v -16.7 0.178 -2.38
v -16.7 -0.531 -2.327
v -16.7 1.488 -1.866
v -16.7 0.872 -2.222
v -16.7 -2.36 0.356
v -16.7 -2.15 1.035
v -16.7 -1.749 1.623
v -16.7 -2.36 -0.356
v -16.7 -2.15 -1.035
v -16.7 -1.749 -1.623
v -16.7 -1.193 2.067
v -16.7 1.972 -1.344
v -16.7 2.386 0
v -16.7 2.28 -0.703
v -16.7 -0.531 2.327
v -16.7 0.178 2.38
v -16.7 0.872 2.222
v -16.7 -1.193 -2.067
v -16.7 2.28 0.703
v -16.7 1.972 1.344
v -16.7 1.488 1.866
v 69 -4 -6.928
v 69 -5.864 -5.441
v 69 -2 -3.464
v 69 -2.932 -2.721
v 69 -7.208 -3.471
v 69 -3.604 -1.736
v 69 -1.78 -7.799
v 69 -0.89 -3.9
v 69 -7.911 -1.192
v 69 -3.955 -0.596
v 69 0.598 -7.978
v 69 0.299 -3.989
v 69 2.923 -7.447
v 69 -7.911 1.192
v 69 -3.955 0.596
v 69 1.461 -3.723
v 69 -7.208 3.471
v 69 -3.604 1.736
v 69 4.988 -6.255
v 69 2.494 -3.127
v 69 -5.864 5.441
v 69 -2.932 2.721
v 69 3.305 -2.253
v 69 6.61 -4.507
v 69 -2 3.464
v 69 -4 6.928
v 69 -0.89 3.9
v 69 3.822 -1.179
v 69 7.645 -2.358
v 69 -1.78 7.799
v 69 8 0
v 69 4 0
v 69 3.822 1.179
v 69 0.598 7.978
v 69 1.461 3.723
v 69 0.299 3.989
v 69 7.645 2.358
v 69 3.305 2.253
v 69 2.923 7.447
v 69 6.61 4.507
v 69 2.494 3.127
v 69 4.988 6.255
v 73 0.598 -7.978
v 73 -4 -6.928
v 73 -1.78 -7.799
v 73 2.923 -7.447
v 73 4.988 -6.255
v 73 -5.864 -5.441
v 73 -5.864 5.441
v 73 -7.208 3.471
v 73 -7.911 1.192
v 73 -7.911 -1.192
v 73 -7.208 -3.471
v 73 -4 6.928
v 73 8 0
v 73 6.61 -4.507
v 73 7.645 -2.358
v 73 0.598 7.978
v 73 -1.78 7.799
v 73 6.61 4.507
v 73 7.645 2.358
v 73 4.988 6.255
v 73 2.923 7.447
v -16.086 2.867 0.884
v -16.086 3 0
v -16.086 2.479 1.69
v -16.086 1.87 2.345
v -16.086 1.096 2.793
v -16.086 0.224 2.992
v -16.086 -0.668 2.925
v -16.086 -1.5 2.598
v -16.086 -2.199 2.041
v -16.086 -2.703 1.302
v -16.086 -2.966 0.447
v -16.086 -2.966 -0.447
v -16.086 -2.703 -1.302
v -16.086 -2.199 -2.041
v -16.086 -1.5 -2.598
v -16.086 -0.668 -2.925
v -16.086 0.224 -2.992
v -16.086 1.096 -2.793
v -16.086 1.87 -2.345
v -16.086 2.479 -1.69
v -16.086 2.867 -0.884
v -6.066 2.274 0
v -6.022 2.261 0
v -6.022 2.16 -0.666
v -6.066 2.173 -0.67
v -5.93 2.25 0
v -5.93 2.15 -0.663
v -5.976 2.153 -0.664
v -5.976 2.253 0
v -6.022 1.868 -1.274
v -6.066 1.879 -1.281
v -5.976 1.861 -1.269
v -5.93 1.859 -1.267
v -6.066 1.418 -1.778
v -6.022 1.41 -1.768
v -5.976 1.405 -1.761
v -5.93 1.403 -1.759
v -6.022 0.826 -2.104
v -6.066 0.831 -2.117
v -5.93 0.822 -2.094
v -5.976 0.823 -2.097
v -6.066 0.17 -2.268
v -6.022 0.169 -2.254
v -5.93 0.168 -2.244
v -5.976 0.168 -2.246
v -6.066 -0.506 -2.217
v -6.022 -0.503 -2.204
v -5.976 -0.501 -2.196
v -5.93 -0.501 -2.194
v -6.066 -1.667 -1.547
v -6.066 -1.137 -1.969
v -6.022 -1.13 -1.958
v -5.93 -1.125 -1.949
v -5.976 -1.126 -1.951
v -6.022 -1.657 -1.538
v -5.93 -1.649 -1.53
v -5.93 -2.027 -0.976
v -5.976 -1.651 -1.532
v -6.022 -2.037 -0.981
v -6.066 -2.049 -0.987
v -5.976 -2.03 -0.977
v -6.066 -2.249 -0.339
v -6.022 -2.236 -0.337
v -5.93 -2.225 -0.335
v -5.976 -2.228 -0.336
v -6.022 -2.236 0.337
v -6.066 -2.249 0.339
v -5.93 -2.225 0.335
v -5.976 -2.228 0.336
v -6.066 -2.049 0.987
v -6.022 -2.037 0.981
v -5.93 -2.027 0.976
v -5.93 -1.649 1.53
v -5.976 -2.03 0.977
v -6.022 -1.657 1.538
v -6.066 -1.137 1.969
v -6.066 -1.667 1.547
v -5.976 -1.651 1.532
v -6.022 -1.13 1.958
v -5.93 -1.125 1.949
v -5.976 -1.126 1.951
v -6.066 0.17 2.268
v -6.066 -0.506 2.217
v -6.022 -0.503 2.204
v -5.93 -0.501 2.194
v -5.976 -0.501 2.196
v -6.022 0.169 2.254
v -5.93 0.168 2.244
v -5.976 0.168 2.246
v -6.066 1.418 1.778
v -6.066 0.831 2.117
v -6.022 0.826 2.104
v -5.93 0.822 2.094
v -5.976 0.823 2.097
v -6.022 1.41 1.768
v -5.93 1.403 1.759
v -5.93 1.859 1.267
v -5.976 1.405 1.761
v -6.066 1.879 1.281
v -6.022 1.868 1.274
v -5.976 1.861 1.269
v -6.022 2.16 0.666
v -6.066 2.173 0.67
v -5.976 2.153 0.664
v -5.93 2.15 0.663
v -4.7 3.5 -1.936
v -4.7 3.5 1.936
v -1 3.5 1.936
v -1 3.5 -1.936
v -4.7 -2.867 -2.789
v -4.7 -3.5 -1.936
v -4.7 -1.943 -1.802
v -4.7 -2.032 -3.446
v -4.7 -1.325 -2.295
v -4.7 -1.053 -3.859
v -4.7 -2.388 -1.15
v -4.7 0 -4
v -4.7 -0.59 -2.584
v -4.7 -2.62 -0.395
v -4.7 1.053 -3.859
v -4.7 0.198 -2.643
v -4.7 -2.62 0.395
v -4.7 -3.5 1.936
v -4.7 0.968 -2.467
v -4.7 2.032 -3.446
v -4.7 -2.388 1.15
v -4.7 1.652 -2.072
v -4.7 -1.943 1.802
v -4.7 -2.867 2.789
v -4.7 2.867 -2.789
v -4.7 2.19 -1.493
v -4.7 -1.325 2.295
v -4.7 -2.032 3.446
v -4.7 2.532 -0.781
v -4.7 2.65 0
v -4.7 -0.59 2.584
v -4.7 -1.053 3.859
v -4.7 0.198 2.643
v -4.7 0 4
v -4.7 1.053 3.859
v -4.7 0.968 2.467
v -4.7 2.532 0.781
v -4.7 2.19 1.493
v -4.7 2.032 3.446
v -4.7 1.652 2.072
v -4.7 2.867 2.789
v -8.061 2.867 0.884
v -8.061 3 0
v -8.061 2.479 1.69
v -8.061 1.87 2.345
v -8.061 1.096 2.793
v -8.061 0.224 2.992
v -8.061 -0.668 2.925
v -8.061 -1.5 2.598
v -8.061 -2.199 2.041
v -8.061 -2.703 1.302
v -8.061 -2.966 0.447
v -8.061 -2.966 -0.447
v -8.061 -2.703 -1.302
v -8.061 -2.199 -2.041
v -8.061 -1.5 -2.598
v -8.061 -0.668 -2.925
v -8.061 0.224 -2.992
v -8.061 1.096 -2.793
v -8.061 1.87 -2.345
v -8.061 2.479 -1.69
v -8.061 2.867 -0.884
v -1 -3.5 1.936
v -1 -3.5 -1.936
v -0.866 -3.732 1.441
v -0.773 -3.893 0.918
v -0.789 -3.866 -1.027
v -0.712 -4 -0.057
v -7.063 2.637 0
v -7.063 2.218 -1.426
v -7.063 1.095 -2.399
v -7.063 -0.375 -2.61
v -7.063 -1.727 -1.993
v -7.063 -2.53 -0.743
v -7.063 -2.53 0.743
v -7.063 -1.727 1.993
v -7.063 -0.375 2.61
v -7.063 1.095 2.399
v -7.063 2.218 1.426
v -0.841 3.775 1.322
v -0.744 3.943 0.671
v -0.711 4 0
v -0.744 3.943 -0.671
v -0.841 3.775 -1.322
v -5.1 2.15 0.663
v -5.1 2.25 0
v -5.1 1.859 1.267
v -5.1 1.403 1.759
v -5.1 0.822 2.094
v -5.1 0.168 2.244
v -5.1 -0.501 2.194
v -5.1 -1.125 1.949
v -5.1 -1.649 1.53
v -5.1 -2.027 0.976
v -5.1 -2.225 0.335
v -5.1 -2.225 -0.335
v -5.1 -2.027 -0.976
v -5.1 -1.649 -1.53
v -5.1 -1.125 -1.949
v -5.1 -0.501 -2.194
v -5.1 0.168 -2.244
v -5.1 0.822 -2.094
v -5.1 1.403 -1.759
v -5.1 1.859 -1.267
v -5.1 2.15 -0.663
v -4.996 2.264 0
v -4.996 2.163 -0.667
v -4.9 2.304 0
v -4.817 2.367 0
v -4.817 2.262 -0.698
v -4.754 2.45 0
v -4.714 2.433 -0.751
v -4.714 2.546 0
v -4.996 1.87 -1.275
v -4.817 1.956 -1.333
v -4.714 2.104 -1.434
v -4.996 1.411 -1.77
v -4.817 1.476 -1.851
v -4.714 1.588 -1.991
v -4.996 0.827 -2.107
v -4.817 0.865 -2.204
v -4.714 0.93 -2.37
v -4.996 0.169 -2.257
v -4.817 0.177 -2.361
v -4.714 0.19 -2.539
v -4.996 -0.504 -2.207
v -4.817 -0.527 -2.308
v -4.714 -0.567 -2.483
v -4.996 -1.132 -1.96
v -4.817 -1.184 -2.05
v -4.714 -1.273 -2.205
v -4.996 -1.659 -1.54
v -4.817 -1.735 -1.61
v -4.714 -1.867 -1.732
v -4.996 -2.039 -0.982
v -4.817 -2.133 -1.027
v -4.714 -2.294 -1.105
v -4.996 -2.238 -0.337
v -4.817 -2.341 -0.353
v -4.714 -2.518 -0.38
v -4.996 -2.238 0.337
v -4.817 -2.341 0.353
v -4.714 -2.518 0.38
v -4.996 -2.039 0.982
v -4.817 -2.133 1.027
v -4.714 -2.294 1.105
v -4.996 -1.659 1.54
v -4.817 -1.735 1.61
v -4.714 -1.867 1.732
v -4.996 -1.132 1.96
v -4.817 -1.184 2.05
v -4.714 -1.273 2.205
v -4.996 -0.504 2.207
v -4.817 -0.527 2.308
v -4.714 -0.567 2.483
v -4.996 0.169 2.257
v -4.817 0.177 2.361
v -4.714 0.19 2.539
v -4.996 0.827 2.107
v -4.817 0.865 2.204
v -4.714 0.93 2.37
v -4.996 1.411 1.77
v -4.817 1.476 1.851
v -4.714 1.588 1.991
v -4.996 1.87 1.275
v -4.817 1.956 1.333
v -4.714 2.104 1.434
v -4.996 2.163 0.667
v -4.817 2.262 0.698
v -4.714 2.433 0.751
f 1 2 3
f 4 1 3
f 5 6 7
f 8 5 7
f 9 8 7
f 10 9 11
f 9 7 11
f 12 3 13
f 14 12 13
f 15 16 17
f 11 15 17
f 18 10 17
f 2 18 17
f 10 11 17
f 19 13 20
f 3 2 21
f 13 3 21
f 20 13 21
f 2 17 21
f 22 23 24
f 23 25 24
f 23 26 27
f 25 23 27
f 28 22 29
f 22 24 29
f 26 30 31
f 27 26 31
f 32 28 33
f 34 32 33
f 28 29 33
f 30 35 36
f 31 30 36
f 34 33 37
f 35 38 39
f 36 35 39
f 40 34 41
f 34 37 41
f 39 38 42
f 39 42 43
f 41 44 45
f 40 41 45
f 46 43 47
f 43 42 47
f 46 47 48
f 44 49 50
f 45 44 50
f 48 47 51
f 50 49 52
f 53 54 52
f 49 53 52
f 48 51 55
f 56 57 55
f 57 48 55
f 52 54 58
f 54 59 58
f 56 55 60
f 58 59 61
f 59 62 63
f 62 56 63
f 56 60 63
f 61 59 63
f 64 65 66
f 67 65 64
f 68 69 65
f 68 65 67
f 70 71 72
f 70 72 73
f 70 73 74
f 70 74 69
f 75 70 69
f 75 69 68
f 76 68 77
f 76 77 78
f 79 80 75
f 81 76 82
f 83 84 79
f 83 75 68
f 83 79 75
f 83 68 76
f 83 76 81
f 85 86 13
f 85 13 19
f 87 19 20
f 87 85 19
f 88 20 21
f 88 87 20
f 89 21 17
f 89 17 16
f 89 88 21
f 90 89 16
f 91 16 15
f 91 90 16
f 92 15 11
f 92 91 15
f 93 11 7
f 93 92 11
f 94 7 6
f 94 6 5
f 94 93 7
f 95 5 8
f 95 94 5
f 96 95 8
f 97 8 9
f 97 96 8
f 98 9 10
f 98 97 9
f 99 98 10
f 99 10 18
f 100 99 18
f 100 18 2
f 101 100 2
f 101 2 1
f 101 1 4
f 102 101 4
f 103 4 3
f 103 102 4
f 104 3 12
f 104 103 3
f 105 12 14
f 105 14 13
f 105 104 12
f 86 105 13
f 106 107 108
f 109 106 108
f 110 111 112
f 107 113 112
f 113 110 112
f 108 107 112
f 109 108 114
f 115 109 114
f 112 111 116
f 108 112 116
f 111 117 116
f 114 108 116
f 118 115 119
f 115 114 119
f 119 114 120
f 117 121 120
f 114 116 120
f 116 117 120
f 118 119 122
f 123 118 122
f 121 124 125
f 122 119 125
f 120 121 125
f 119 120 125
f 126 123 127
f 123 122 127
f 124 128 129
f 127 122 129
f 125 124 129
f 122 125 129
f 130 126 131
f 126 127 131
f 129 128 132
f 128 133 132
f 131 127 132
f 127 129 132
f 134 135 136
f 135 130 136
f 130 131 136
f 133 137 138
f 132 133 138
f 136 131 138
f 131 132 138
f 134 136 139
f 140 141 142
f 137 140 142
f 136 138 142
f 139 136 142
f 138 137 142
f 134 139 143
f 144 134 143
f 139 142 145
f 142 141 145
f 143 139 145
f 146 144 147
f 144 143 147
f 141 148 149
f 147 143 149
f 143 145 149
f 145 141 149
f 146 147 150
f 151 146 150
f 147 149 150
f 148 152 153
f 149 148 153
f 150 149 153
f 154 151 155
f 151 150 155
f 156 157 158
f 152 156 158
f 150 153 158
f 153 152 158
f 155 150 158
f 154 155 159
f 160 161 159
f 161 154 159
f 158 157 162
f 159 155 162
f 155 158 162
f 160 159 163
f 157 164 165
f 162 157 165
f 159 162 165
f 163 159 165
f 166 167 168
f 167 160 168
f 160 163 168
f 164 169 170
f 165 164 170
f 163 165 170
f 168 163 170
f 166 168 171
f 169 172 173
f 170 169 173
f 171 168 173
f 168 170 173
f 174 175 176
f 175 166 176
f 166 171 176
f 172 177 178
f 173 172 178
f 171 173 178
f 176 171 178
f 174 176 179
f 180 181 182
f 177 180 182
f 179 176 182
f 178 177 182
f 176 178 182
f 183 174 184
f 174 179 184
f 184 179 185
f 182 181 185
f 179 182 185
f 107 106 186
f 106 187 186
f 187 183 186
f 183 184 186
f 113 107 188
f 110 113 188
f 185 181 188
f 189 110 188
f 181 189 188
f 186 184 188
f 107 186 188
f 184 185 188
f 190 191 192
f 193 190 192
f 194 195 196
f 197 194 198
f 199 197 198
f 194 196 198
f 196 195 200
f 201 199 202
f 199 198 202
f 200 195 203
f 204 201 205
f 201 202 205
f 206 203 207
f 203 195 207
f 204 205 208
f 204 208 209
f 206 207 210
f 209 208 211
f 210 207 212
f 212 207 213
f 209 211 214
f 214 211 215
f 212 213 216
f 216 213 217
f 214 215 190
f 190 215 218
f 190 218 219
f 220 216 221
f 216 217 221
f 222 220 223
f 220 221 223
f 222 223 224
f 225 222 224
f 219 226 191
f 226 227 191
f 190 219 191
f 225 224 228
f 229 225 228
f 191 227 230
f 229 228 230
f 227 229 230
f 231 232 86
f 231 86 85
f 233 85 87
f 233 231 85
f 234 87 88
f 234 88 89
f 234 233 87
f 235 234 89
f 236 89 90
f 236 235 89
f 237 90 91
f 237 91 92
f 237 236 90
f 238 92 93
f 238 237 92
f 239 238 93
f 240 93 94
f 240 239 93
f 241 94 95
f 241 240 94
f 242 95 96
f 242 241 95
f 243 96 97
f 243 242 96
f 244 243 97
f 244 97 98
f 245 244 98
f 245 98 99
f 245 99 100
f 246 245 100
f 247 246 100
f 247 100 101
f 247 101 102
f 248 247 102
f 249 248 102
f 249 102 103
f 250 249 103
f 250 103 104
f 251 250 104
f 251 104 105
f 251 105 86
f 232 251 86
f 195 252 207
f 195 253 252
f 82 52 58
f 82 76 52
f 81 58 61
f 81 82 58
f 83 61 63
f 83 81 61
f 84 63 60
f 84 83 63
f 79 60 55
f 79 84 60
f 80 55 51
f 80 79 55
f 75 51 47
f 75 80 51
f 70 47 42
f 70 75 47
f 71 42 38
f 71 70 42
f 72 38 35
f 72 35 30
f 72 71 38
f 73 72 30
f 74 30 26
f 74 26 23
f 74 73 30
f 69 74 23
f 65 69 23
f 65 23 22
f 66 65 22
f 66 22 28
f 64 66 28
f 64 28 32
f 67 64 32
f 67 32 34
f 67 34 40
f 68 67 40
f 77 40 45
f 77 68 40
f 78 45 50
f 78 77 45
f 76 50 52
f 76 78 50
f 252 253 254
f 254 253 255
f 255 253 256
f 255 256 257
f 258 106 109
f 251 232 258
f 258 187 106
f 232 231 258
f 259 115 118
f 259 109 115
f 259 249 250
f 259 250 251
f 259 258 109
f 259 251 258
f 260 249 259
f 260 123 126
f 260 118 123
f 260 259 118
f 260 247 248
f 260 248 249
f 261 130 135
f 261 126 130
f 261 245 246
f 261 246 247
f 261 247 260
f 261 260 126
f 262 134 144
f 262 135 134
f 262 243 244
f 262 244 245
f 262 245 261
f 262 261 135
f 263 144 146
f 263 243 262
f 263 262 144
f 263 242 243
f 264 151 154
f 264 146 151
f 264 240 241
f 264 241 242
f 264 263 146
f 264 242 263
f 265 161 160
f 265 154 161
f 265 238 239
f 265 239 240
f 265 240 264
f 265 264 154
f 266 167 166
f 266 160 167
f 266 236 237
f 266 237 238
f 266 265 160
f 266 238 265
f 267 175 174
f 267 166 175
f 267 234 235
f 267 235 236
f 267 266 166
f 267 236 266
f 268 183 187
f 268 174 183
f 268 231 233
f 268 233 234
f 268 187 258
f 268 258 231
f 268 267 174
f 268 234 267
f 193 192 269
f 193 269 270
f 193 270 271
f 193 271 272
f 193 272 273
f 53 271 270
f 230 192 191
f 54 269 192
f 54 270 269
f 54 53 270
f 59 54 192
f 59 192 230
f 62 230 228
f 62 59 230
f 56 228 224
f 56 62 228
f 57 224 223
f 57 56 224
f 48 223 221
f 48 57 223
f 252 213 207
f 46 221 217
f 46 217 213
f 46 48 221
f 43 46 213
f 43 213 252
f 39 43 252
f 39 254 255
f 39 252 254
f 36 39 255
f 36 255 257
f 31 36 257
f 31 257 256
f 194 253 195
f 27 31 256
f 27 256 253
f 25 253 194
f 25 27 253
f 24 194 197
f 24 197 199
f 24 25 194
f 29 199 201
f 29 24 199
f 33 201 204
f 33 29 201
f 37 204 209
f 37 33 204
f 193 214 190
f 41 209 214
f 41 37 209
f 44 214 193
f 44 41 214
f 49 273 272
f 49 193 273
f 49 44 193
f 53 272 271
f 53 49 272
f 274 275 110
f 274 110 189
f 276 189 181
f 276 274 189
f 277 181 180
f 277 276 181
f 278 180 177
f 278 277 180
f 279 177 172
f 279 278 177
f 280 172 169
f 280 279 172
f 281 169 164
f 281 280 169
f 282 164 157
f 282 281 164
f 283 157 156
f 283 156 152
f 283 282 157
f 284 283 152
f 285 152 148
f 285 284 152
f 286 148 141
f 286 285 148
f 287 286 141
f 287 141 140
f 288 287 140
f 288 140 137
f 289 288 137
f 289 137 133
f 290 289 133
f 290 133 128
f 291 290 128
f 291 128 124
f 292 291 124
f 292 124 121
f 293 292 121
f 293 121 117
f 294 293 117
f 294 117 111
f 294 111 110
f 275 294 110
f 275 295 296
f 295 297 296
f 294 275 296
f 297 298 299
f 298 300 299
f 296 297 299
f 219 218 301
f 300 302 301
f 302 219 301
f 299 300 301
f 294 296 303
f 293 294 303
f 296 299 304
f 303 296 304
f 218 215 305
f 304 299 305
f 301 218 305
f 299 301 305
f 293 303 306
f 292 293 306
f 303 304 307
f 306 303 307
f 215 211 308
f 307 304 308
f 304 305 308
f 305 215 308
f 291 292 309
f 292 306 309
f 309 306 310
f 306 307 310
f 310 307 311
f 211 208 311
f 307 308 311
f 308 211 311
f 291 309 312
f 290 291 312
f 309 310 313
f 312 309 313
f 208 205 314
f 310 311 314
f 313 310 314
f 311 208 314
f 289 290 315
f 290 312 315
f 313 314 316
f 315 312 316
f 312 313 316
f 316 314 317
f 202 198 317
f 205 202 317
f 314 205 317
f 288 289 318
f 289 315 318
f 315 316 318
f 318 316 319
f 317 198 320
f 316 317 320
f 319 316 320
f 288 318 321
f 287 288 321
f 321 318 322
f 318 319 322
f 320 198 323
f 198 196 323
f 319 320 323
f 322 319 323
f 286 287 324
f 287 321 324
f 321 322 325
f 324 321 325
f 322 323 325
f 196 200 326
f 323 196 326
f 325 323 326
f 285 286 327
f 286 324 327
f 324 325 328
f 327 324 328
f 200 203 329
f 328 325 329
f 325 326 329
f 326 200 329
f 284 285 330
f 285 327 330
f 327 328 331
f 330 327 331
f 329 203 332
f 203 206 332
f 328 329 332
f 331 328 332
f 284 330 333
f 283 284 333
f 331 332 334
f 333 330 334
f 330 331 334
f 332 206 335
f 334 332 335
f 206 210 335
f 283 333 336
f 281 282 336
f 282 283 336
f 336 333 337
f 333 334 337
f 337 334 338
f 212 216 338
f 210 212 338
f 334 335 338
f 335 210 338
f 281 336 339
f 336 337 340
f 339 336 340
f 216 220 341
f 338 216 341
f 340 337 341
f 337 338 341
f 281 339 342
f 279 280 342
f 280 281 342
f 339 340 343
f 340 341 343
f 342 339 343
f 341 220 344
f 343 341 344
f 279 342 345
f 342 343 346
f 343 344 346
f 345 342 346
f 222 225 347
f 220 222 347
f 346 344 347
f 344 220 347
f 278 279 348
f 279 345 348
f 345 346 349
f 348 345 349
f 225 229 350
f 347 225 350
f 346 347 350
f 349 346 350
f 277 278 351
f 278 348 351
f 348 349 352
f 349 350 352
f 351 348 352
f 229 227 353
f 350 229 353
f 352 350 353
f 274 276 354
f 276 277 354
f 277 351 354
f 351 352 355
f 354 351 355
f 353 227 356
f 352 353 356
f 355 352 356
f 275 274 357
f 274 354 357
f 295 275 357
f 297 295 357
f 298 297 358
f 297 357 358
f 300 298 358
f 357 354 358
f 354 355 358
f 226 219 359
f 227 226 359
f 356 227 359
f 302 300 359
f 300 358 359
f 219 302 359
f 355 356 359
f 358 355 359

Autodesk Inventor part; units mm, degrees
sketch "Sketch_1" plane through (0, 0, 0) normal (0, 0, 1) x (1, 0, 0)
  line L0 (73, 0) -> (-4.7, 0)
  line L1 (-4.7, 0) -> (-4.7, 4)
  line L2 (-4.7, 4) -> (73, 4)
  line L3 (73, 4) -> (73, 0)
  line L4 (73, 0) -> (-4.7, 0)
revolve "Revolution1" add sketch "Sketch_1" angle 360 about axis through (73, 0, 0) along (1, 0, 0)
sketch "Sketch_11" plane through (0, 0, 0) normal (0, 0, 1) x (1, 0, 0)
  line L0 (73, 0) -> (69, 0)
  line L1 (69, 0) -> (69, 8)
  line L2 (69, 8) -> (73, 8)
  line L3 (73, 8) -> (73, 0)
  line L4 (73, 0) -> (69, 0)
revolve "Revolution2" add sketch "Sketch_11" angle 360 about axis through (73, 0, 0) along (1, 0, 0)
sketch "Sketch_19" plane through (0, 0, 0) normal (0, 0, 1) x (1, 0, 0)
  line L0 (-3.7, 0) -> (-16.7, 0)
  line L1 (-16.7, 0) -> (-16.7, 2.3865)
  line L2 (-16.7, 2.3865) -> (-16.0865, 3)
  line L3 (-16.0865, 3) -> (-8.0606, 3)
  line L4 (-8.0606, 3) -> (-6.0663, 2.2741)
  arc A0 (-6.0663, 2.2741) -> (-5.9295, 2.25) centre (-5.9295, 2.65) ccw
  line L5 (-5.9295, 2.25) -> (-5.1, 2.25)
  arc A1 (-5.1, 2.25) -> (-4.7, 2.65) centre (-5.1, 2.65) ccw
  line L6 (-4.7, 2.65) -> (-4.7, 3)
  line L7 (-4.7, 3) -> (-3.7, 3)
  line L8 (-3.7, 3) -> (-3.7, 0)
  line L9 (-3.7, 0) -> (-16.7, 0)
revolve "Revolution3" add sketch "Sketch_19" angle 360 about axis through (-3.7, 0, 0) along (1, 0, 0)
thread "Thread1" size "M6x1" class "6g" standard "ISO Metric profile" full length
sketch "Sketch_20" plane through (0, 0, 0) normal (0, 0, 1) x (1, 0, 0)
  line L0 (-26.4, -12.5) -> (4.1962, -12.5)
  line L1 (4.1962, -12.5) -> (-1, -3.5)
  line L2 (-1, -3.5) -> (-4.7, -3.5)
  line L3 (-4.7, -3.5) -> (-4.7, -8.5)
  line L4 (-4.7, -8.5) -> (-21.7, -8.5)
  line L5 (-21.7, -8.5) -> (-21.7, 8.5)
  line L6 (-21.7, 8.5) -> (-4.7, 8.5)
  line L7 (-4.7, 8.5) -> (-4.7, 3.5)
  line L8 (-4.7, 3.5) -> (-1, 3.5)
  line L9 (-1, 3.5) -> (4.1962, 12.5)
  line L10 (4.1962, 12.5) -> (-26.4, 12.5)
  line L11 (-26.4, 12.5) -> (-26.4, -12.5)
extrude "Extrusion1" cut sketch "Sketch_20" along normal mid plane 16
ref_plane "FDT_PIRODACC_M1_XY" through (-10.9, 0, 0) normal (-1, 0, 0) x (0, 1, 0)
ref_plane "FDT_PIRODACC_M1_YZ" through (-10.9, 0, 0) normal (0, 1, 0) x (0, 0, -1)
ref_plane "FDT_PIRODACC_M1_ZX" through (-10.9, 0, 0) normal (0, 0, -1) x (-1, 0, 0)
ref_plane "NUT1_XY" through (-9.3, 0, 0) normal (1, 0, 0) x (0, 0, -1)
ref_plane "NUT1_YZ" through (-9.3, 0, 0) normal (0, 0, -1) x (0, 1, 0)
ref_plane "NUT1_ZX" through (-9.3, 0, 0) normal (0, 1, 0) x (1, 0, 0)
ref_plane "PISTON_XY" through (73, 0, 0) normal (1, 0, 0) x (0, 0, -1)
ref_plane "PISTON_YZ" through (73, 0, 0) normal (0, 0, -1) x (0, 1, 0)
ref_plane "PISTON_ZX" through (73, 0, 0) normal (0, 1, 0) x (1, 0, 0)
properties part number "536218 ADN-50-P-A_(KS)"
